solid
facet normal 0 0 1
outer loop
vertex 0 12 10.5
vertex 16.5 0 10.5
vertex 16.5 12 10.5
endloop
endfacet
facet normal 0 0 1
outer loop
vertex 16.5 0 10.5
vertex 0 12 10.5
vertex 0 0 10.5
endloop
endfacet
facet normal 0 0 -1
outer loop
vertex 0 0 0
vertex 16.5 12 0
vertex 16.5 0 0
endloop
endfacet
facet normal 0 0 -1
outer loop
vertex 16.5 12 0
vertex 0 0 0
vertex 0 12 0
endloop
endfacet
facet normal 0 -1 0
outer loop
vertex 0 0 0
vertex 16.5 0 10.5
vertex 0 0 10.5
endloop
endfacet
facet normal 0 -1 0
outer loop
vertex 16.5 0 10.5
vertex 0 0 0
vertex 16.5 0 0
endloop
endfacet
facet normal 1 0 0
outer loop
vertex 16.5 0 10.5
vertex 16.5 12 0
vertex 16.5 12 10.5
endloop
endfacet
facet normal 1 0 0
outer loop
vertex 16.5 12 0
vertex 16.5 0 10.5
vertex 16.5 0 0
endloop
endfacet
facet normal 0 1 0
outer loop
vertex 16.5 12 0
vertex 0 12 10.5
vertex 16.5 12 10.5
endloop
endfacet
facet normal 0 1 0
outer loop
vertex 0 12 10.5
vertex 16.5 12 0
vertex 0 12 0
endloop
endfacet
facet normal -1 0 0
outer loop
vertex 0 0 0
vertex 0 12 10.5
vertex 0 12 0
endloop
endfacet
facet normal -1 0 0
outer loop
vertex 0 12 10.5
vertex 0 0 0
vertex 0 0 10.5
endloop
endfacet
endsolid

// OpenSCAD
module usb_a()
{
    color("silver")
    {
        cube([
            16.5,
            12,
            10.5
            ]);
    }
}

usb_a();
